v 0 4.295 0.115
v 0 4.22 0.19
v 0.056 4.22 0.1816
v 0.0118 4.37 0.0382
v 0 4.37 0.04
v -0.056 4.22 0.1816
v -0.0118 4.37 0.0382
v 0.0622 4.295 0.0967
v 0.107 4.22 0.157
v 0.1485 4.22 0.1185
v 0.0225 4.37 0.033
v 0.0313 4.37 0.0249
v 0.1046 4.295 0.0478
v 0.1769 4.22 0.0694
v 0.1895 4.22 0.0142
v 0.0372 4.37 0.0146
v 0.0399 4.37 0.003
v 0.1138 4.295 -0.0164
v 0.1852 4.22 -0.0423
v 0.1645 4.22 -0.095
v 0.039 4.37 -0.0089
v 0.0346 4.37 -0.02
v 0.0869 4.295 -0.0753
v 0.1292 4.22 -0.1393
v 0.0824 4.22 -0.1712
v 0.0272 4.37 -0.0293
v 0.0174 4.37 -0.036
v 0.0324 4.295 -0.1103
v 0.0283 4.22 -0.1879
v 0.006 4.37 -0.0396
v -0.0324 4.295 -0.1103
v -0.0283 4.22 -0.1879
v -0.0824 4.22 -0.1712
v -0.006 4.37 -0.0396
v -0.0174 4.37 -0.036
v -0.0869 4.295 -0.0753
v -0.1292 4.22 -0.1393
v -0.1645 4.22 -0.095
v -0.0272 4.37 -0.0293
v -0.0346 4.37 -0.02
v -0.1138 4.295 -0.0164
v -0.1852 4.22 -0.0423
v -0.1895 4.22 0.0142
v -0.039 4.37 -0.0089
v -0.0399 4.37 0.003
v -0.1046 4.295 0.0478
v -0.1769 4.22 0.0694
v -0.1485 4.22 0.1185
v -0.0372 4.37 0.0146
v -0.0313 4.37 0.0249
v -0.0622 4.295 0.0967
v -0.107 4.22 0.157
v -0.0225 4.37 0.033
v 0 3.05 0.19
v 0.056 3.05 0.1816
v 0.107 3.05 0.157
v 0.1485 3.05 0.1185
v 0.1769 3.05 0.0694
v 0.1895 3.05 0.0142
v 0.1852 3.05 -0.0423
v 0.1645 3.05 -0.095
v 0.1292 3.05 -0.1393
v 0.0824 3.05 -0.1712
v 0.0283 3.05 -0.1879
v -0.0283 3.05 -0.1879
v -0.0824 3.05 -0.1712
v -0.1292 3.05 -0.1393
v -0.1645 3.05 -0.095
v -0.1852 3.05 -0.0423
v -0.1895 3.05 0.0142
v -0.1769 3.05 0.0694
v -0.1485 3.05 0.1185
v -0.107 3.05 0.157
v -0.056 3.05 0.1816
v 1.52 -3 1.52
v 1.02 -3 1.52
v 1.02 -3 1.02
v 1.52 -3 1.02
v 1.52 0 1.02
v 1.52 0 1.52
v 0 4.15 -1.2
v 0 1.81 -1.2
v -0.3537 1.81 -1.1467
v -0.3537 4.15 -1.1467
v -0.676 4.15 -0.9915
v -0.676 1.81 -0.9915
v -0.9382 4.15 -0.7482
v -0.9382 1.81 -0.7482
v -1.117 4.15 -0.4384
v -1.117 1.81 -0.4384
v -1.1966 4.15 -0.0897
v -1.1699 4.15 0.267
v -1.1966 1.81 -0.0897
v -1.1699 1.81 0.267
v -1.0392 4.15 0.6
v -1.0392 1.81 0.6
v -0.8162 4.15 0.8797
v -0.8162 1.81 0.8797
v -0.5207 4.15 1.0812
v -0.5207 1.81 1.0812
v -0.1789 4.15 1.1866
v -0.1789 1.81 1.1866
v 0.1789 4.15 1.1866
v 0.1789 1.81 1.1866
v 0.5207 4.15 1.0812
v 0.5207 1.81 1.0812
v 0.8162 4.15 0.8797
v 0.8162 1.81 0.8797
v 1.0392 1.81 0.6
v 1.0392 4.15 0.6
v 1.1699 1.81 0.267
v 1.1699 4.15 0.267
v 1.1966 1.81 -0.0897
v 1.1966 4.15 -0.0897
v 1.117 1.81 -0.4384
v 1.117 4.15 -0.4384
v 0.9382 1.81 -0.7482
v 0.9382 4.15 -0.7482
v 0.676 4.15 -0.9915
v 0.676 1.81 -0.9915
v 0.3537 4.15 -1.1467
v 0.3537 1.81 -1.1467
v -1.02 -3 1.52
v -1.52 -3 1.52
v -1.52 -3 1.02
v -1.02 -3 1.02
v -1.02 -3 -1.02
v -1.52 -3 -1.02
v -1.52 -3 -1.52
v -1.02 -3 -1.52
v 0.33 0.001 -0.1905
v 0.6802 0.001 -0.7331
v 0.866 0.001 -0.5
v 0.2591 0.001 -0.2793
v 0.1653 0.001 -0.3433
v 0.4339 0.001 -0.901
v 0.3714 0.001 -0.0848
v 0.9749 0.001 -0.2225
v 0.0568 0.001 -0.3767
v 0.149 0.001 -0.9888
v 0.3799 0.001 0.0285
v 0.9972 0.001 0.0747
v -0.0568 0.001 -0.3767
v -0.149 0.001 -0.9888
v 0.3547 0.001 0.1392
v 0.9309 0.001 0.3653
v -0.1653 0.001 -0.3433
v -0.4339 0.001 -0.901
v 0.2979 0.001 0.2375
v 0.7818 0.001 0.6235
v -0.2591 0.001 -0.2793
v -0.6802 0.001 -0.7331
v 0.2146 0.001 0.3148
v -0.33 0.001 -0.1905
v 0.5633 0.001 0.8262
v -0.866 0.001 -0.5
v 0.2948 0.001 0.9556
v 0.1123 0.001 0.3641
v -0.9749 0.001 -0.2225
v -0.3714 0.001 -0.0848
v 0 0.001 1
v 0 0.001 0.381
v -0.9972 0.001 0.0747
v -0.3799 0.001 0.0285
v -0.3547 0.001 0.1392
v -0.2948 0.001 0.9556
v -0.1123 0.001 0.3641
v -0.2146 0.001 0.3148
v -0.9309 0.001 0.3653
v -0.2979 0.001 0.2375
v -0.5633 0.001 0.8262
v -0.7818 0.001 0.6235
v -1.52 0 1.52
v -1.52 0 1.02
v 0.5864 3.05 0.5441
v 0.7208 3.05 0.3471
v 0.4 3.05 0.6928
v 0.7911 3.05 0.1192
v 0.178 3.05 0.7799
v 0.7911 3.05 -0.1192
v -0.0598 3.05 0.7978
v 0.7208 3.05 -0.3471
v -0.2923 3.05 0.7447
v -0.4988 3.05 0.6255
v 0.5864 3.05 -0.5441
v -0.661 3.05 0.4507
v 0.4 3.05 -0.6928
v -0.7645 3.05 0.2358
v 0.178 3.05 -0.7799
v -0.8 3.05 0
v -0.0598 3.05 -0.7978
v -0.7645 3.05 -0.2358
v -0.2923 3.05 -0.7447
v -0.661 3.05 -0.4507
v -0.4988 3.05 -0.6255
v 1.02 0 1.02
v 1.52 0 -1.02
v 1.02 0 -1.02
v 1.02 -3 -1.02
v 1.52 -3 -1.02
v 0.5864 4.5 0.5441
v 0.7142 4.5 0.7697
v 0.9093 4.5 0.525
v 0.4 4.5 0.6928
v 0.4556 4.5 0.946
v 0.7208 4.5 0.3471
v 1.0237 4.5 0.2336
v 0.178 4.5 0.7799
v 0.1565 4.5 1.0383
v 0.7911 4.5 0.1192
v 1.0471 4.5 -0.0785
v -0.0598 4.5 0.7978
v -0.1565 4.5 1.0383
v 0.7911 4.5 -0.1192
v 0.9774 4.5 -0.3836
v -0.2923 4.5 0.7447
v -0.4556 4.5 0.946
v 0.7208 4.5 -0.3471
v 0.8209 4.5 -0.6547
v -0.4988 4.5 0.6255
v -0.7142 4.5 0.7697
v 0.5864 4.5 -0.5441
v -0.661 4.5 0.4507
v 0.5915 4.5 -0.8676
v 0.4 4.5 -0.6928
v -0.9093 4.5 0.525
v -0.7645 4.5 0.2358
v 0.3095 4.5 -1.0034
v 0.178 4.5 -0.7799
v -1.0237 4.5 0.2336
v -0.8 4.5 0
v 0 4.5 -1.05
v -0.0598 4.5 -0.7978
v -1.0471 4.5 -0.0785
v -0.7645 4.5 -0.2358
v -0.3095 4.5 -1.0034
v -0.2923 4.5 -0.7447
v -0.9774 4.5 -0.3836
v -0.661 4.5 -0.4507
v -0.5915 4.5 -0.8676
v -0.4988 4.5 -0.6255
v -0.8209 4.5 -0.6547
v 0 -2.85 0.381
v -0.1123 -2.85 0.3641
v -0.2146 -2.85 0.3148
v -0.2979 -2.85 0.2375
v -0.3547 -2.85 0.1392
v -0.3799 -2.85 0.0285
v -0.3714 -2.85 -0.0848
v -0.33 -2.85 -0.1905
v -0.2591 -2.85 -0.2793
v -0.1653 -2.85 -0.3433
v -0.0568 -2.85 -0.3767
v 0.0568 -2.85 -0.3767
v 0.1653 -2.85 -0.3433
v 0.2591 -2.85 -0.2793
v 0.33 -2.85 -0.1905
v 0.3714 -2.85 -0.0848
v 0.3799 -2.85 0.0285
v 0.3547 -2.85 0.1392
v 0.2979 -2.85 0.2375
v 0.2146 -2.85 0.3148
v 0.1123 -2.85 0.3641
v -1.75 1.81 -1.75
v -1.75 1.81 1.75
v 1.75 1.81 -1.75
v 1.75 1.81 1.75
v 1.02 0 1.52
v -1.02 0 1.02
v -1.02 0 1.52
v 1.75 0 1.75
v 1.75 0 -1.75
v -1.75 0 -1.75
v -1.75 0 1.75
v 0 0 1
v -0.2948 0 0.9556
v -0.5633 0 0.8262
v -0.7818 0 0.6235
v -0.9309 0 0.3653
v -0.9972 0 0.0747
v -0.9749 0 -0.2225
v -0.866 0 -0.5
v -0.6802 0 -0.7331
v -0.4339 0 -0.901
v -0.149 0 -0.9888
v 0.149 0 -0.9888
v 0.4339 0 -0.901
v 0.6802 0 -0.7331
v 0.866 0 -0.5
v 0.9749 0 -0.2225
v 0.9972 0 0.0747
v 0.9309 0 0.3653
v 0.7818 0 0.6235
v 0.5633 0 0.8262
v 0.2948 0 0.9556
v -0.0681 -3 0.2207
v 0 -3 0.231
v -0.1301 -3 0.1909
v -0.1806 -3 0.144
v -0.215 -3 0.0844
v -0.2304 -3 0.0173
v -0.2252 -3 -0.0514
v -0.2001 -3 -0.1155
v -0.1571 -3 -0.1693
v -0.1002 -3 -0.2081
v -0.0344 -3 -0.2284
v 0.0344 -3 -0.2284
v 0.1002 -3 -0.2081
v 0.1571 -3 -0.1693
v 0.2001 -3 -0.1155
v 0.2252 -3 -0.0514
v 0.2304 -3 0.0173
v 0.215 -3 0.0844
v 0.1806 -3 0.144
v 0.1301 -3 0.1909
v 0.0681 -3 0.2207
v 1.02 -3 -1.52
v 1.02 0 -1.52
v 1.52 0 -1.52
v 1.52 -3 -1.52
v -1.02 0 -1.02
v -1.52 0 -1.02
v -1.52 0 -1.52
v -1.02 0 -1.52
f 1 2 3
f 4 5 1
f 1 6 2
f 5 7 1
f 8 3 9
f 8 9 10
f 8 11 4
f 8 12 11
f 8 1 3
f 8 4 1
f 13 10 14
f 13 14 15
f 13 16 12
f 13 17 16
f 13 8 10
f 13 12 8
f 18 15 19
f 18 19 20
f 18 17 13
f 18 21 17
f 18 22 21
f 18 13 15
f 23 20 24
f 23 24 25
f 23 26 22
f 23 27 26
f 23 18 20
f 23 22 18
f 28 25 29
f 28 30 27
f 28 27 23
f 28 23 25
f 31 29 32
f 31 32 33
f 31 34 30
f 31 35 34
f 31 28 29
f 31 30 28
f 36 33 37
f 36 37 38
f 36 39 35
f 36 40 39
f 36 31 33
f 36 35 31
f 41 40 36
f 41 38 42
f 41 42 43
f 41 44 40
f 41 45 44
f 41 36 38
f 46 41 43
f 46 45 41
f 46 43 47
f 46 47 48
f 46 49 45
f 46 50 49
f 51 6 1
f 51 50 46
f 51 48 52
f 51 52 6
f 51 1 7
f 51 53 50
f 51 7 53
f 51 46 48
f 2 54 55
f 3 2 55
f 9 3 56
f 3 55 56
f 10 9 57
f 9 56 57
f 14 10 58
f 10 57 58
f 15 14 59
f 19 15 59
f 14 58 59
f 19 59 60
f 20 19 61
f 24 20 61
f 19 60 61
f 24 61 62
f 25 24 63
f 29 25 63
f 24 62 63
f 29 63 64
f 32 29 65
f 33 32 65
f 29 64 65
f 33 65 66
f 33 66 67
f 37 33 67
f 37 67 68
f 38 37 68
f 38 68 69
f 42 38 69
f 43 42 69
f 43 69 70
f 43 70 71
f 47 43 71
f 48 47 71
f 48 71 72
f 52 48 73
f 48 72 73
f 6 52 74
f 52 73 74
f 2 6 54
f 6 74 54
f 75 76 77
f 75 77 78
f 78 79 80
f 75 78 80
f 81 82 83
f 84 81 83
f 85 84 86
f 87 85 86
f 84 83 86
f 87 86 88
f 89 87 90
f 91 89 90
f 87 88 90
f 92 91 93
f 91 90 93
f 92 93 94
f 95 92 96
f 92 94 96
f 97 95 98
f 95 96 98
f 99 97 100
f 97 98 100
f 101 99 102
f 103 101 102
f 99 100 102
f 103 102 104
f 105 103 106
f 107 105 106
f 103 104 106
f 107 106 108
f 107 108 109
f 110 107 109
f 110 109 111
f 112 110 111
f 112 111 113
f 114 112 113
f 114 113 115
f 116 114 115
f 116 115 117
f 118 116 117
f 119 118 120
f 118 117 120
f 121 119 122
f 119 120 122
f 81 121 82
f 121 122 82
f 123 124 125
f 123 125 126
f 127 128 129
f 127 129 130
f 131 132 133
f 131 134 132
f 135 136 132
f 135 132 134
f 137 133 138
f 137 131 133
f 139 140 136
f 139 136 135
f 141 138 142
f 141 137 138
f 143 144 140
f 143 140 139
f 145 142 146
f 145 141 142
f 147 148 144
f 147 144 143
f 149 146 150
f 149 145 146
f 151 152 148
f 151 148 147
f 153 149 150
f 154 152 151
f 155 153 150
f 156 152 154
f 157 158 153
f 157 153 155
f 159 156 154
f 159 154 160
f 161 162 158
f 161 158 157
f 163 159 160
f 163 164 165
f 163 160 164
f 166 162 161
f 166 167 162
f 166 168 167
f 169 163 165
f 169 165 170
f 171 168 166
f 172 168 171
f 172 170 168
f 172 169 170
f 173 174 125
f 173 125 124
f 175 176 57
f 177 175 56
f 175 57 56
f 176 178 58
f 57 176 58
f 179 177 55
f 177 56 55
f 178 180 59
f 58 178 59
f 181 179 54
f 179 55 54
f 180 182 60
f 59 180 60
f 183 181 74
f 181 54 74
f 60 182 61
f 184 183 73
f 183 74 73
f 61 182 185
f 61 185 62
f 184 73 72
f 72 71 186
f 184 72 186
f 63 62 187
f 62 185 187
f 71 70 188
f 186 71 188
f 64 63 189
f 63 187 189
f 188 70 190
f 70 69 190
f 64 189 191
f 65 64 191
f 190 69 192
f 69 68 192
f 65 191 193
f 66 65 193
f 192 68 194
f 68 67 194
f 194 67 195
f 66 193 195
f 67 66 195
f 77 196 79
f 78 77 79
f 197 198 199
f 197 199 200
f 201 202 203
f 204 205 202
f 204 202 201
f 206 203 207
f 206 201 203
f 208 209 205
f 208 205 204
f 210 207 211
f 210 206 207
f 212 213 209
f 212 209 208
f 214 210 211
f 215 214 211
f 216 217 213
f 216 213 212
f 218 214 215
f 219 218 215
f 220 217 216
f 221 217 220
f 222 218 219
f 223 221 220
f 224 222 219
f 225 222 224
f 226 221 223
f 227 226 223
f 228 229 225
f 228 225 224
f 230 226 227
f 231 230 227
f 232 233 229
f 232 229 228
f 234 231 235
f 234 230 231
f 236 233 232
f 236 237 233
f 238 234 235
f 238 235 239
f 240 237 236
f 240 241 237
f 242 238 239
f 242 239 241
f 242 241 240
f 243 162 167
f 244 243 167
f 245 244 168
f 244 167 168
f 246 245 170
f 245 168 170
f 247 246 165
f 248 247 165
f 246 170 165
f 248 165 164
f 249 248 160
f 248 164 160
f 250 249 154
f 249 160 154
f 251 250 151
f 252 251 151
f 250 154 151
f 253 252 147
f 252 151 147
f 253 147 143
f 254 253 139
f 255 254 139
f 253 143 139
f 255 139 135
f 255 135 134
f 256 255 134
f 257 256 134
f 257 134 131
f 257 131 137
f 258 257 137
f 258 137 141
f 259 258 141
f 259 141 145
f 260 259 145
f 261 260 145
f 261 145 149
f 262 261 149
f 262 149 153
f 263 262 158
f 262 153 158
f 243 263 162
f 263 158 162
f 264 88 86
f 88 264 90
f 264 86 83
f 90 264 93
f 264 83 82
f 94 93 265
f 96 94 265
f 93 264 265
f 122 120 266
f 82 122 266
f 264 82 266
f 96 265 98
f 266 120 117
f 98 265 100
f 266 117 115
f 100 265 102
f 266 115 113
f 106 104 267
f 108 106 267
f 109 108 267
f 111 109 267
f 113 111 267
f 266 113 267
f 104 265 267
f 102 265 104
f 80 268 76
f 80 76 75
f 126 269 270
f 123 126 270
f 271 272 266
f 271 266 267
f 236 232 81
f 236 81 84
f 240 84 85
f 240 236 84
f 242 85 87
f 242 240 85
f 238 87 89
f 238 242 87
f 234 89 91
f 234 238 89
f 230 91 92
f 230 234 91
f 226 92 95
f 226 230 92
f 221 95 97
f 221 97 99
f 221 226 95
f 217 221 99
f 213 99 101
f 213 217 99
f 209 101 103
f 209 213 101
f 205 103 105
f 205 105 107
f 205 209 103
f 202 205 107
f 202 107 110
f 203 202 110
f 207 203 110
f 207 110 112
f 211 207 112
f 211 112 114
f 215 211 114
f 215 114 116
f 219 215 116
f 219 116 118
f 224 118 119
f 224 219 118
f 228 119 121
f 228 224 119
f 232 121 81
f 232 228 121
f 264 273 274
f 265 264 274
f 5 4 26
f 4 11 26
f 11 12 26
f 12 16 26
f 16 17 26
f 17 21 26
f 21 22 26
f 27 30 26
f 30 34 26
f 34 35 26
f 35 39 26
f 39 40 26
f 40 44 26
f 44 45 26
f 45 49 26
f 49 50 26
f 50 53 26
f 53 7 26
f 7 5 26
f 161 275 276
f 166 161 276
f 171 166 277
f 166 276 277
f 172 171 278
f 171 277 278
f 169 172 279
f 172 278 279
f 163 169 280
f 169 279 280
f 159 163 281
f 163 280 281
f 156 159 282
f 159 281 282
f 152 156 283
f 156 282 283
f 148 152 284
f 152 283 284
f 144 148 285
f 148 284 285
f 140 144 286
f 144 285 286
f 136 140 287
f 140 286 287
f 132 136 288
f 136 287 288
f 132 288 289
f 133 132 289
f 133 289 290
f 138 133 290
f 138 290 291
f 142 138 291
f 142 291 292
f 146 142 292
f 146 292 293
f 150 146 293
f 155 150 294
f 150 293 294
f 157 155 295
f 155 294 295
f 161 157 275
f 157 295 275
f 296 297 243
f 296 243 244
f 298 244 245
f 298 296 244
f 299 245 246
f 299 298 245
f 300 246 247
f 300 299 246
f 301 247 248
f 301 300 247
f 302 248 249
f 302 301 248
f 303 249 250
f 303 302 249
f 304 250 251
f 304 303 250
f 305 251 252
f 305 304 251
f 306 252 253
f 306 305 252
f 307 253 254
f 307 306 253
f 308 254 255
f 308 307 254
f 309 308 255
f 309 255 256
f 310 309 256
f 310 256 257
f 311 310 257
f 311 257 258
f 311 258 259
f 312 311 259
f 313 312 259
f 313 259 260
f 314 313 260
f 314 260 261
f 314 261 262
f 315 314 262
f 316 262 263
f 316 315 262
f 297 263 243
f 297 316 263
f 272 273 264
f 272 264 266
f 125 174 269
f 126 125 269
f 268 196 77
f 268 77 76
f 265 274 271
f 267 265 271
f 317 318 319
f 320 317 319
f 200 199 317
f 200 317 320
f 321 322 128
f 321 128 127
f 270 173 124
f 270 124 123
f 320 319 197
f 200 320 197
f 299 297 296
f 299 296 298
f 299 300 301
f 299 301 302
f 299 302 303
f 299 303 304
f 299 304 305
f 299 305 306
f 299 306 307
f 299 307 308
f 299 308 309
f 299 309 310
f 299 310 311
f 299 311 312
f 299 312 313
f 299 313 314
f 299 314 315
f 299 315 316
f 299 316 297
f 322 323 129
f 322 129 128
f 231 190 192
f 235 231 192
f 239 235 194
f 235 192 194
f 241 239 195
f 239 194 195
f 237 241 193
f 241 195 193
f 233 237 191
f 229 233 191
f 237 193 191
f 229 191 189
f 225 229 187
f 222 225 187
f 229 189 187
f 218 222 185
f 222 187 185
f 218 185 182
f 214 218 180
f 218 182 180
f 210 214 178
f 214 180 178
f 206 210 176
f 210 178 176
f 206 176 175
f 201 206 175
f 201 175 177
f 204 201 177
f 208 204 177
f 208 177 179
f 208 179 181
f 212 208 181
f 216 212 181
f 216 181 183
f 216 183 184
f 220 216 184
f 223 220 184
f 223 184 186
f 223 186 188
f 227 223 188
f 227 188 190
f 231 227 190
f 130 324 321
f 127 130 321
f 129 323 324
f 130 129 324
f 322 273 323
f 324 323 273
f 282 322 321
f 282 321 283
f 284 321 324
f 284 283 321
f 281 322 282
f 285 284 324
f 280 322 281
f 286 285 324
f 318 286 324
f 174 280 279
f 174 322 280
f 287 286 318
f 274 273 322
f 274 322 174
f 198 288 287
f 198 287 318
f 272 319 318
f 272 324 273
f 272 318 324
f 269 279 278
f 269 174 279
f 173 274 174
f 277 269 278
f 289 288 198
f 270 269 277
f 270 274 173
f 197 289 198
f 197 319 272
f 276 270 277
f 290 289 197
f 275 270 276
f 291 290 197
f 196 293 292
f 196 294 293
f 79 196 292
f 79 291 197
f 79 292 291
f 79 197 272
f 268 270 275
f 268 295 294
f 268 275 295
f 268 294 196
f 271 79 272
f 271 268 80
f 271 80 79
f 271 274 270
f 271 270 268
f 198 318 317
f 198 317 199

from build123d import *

# Parameters (mm, degrees)
SKETCH1_W           = 3.5
SKETCH1_H           = 3.5
BOSS_EXTRUDE1_DEPTH = 1.81
SKETCH2_W           = 0.5
SKETCH2_H           = 0.5
BOSS_EXTRUDE2_DEPTH = 3
SKETCH6_R           = 1
CUT_EXTRUDE1_DEPTH  = 0.001
SKETCH7_R           = 1.2
BOSS_EXTRUDE6_DEPTH = 2.69
HOLE1_D             = 1.6
HOLE1_DEPTH         = 1.45
CHAMFER3_SIZE       = 0.15
SKETCH12_R          = 0.381
BOSS_EXTRUDE7_DEPTH = 3.001
CHAMFER1_SIZE       = 0.15
CHAMFER2_SIZE       = 0.35
CHAMFER2_SIZE2      = 0.15


with BuildPart() as part:
    # Sketch1 → Boss-Extrude1 (new body)
    with BuildSketch(Plane.XZ):
        Rectangle(SKETCH1_W, SKETCH1_H)
    extrude(amount=-BOSS_EXTRUDE1_DEPTH)

    # Sketch2 → Boss-Extrude2 (add)
    with BuildSketch(Plane.XZ):
        with Locations((-1.27, -1.27)):
            Rectangle(SKETCH2_W, SKETCH2_H)
        with Locations((1.27, -1.27)):
            Rectangle(SKETCH2_W, SKETCH2_H)
        with Locations((1.27, 1.27)):
            Rectangle(SKETCH2_W, SKETCH2_H)
        with Locations((-1.27, 1.27)):
            Rectangle(SKETCH2_W, SKETCH2_H)
    extrude(amount=BOSS_EXTRUDE2_DEPTH)

    # Sketch6 → Cut-Extrude1 (cut)
    with BuildSketch(Plane.XZ):
        with Locations(Location((0, 0, 0), (0, 0, 90))):
            Circle(SKETCH6_R)
    extrude(amount=-CUT_EXTRUDE1_DEPTH, mode=Mode.SUBTRACT)

    # Sketch7 → Boss-Extrude6 (add)
    with BuildSketch(Plane(origin=(0, 1.81, 0), x_dir=(-1, 0, 0), z_dir=(0, 1, 0))):
        with Locations(Location((0, 0, 0), (0, 0, 270))):
            Circle(SKETCH7_R)
    extrude(amount=BOSS_EXTRUDE6_DEPTH)

    # Hole1
    with Locations(Plane(origin=(0, 4.5, 0), x_dir=(1, 0, 0), z_dir=(0, 1, 0))):
        with Locations((0, 0)):
            Hole(HOLE1_D / 2, depth=HOLE1_DEPTH)

    # Sketch10 → Revolve1 (revolve)
    with BuildSketch(Plane(origin=(0, 0, 0), x_dir=(-1, 0, 0), z_dir=(0, 0, -1)), mode=Mode.PRIVATE) as revolve1_sk:
        Polygon((-0.19, 3.05), (0, 3.05), (0, 4.37), (-0.0405, 4.37), (-0.19, 4.37), (-0.19, 4.220000833), align=None)
    revolve(revolve1_sk.sketch.rotate(Axis((0, 3.05, 0), (0, 1, 0)), 270), axis=Axis((0, 3.05, 0), (0, 1, 0)))

    # Chamfer3
    chamfer3_edges = [part.edges().sort_by_distance(p)[0] for p in [
        (0, 4.37, -0.19),
    ]]
    chamfer(chamfer3_edges, length=CHAMFER3_SIZE)

    # Sketch12 → Boss-Extrude7 (add)
    with BuildSketch(Plane.XZ.offset(-0.001)):
        with Locations(Location((0, 0, 0), (0, 0, 90))):
            Circle(SKETCH12_R)
    extrude(amount=BOSS_EXTRUDE7_DEPTH)

    # Chamfer1
    chamfer1_edges = [part.edges().sort_by_distance(p)[0] for p in [
        (0, -3, -0.381),
    ]]
    chamfer(chamfer1_edges, length=CHAMFER1_SIZE)

    # Chamfer2
    chamfer2_edges = [part.edges().sort_by_distance(p)[0] for p in [
        (0, 4.5, 1.2),
    ]]
    chamfer2_side = [part.faces().sort_by_distance(p)[0] for p in [
        (0, 3.155, 1.2),
    ]]
    chamfer(chamfer2_edges, length=CHAMFER2_SIZE, length2=CHAMFER2_SIZE2, reference=chamfer2_side[0])


solid = part.part
